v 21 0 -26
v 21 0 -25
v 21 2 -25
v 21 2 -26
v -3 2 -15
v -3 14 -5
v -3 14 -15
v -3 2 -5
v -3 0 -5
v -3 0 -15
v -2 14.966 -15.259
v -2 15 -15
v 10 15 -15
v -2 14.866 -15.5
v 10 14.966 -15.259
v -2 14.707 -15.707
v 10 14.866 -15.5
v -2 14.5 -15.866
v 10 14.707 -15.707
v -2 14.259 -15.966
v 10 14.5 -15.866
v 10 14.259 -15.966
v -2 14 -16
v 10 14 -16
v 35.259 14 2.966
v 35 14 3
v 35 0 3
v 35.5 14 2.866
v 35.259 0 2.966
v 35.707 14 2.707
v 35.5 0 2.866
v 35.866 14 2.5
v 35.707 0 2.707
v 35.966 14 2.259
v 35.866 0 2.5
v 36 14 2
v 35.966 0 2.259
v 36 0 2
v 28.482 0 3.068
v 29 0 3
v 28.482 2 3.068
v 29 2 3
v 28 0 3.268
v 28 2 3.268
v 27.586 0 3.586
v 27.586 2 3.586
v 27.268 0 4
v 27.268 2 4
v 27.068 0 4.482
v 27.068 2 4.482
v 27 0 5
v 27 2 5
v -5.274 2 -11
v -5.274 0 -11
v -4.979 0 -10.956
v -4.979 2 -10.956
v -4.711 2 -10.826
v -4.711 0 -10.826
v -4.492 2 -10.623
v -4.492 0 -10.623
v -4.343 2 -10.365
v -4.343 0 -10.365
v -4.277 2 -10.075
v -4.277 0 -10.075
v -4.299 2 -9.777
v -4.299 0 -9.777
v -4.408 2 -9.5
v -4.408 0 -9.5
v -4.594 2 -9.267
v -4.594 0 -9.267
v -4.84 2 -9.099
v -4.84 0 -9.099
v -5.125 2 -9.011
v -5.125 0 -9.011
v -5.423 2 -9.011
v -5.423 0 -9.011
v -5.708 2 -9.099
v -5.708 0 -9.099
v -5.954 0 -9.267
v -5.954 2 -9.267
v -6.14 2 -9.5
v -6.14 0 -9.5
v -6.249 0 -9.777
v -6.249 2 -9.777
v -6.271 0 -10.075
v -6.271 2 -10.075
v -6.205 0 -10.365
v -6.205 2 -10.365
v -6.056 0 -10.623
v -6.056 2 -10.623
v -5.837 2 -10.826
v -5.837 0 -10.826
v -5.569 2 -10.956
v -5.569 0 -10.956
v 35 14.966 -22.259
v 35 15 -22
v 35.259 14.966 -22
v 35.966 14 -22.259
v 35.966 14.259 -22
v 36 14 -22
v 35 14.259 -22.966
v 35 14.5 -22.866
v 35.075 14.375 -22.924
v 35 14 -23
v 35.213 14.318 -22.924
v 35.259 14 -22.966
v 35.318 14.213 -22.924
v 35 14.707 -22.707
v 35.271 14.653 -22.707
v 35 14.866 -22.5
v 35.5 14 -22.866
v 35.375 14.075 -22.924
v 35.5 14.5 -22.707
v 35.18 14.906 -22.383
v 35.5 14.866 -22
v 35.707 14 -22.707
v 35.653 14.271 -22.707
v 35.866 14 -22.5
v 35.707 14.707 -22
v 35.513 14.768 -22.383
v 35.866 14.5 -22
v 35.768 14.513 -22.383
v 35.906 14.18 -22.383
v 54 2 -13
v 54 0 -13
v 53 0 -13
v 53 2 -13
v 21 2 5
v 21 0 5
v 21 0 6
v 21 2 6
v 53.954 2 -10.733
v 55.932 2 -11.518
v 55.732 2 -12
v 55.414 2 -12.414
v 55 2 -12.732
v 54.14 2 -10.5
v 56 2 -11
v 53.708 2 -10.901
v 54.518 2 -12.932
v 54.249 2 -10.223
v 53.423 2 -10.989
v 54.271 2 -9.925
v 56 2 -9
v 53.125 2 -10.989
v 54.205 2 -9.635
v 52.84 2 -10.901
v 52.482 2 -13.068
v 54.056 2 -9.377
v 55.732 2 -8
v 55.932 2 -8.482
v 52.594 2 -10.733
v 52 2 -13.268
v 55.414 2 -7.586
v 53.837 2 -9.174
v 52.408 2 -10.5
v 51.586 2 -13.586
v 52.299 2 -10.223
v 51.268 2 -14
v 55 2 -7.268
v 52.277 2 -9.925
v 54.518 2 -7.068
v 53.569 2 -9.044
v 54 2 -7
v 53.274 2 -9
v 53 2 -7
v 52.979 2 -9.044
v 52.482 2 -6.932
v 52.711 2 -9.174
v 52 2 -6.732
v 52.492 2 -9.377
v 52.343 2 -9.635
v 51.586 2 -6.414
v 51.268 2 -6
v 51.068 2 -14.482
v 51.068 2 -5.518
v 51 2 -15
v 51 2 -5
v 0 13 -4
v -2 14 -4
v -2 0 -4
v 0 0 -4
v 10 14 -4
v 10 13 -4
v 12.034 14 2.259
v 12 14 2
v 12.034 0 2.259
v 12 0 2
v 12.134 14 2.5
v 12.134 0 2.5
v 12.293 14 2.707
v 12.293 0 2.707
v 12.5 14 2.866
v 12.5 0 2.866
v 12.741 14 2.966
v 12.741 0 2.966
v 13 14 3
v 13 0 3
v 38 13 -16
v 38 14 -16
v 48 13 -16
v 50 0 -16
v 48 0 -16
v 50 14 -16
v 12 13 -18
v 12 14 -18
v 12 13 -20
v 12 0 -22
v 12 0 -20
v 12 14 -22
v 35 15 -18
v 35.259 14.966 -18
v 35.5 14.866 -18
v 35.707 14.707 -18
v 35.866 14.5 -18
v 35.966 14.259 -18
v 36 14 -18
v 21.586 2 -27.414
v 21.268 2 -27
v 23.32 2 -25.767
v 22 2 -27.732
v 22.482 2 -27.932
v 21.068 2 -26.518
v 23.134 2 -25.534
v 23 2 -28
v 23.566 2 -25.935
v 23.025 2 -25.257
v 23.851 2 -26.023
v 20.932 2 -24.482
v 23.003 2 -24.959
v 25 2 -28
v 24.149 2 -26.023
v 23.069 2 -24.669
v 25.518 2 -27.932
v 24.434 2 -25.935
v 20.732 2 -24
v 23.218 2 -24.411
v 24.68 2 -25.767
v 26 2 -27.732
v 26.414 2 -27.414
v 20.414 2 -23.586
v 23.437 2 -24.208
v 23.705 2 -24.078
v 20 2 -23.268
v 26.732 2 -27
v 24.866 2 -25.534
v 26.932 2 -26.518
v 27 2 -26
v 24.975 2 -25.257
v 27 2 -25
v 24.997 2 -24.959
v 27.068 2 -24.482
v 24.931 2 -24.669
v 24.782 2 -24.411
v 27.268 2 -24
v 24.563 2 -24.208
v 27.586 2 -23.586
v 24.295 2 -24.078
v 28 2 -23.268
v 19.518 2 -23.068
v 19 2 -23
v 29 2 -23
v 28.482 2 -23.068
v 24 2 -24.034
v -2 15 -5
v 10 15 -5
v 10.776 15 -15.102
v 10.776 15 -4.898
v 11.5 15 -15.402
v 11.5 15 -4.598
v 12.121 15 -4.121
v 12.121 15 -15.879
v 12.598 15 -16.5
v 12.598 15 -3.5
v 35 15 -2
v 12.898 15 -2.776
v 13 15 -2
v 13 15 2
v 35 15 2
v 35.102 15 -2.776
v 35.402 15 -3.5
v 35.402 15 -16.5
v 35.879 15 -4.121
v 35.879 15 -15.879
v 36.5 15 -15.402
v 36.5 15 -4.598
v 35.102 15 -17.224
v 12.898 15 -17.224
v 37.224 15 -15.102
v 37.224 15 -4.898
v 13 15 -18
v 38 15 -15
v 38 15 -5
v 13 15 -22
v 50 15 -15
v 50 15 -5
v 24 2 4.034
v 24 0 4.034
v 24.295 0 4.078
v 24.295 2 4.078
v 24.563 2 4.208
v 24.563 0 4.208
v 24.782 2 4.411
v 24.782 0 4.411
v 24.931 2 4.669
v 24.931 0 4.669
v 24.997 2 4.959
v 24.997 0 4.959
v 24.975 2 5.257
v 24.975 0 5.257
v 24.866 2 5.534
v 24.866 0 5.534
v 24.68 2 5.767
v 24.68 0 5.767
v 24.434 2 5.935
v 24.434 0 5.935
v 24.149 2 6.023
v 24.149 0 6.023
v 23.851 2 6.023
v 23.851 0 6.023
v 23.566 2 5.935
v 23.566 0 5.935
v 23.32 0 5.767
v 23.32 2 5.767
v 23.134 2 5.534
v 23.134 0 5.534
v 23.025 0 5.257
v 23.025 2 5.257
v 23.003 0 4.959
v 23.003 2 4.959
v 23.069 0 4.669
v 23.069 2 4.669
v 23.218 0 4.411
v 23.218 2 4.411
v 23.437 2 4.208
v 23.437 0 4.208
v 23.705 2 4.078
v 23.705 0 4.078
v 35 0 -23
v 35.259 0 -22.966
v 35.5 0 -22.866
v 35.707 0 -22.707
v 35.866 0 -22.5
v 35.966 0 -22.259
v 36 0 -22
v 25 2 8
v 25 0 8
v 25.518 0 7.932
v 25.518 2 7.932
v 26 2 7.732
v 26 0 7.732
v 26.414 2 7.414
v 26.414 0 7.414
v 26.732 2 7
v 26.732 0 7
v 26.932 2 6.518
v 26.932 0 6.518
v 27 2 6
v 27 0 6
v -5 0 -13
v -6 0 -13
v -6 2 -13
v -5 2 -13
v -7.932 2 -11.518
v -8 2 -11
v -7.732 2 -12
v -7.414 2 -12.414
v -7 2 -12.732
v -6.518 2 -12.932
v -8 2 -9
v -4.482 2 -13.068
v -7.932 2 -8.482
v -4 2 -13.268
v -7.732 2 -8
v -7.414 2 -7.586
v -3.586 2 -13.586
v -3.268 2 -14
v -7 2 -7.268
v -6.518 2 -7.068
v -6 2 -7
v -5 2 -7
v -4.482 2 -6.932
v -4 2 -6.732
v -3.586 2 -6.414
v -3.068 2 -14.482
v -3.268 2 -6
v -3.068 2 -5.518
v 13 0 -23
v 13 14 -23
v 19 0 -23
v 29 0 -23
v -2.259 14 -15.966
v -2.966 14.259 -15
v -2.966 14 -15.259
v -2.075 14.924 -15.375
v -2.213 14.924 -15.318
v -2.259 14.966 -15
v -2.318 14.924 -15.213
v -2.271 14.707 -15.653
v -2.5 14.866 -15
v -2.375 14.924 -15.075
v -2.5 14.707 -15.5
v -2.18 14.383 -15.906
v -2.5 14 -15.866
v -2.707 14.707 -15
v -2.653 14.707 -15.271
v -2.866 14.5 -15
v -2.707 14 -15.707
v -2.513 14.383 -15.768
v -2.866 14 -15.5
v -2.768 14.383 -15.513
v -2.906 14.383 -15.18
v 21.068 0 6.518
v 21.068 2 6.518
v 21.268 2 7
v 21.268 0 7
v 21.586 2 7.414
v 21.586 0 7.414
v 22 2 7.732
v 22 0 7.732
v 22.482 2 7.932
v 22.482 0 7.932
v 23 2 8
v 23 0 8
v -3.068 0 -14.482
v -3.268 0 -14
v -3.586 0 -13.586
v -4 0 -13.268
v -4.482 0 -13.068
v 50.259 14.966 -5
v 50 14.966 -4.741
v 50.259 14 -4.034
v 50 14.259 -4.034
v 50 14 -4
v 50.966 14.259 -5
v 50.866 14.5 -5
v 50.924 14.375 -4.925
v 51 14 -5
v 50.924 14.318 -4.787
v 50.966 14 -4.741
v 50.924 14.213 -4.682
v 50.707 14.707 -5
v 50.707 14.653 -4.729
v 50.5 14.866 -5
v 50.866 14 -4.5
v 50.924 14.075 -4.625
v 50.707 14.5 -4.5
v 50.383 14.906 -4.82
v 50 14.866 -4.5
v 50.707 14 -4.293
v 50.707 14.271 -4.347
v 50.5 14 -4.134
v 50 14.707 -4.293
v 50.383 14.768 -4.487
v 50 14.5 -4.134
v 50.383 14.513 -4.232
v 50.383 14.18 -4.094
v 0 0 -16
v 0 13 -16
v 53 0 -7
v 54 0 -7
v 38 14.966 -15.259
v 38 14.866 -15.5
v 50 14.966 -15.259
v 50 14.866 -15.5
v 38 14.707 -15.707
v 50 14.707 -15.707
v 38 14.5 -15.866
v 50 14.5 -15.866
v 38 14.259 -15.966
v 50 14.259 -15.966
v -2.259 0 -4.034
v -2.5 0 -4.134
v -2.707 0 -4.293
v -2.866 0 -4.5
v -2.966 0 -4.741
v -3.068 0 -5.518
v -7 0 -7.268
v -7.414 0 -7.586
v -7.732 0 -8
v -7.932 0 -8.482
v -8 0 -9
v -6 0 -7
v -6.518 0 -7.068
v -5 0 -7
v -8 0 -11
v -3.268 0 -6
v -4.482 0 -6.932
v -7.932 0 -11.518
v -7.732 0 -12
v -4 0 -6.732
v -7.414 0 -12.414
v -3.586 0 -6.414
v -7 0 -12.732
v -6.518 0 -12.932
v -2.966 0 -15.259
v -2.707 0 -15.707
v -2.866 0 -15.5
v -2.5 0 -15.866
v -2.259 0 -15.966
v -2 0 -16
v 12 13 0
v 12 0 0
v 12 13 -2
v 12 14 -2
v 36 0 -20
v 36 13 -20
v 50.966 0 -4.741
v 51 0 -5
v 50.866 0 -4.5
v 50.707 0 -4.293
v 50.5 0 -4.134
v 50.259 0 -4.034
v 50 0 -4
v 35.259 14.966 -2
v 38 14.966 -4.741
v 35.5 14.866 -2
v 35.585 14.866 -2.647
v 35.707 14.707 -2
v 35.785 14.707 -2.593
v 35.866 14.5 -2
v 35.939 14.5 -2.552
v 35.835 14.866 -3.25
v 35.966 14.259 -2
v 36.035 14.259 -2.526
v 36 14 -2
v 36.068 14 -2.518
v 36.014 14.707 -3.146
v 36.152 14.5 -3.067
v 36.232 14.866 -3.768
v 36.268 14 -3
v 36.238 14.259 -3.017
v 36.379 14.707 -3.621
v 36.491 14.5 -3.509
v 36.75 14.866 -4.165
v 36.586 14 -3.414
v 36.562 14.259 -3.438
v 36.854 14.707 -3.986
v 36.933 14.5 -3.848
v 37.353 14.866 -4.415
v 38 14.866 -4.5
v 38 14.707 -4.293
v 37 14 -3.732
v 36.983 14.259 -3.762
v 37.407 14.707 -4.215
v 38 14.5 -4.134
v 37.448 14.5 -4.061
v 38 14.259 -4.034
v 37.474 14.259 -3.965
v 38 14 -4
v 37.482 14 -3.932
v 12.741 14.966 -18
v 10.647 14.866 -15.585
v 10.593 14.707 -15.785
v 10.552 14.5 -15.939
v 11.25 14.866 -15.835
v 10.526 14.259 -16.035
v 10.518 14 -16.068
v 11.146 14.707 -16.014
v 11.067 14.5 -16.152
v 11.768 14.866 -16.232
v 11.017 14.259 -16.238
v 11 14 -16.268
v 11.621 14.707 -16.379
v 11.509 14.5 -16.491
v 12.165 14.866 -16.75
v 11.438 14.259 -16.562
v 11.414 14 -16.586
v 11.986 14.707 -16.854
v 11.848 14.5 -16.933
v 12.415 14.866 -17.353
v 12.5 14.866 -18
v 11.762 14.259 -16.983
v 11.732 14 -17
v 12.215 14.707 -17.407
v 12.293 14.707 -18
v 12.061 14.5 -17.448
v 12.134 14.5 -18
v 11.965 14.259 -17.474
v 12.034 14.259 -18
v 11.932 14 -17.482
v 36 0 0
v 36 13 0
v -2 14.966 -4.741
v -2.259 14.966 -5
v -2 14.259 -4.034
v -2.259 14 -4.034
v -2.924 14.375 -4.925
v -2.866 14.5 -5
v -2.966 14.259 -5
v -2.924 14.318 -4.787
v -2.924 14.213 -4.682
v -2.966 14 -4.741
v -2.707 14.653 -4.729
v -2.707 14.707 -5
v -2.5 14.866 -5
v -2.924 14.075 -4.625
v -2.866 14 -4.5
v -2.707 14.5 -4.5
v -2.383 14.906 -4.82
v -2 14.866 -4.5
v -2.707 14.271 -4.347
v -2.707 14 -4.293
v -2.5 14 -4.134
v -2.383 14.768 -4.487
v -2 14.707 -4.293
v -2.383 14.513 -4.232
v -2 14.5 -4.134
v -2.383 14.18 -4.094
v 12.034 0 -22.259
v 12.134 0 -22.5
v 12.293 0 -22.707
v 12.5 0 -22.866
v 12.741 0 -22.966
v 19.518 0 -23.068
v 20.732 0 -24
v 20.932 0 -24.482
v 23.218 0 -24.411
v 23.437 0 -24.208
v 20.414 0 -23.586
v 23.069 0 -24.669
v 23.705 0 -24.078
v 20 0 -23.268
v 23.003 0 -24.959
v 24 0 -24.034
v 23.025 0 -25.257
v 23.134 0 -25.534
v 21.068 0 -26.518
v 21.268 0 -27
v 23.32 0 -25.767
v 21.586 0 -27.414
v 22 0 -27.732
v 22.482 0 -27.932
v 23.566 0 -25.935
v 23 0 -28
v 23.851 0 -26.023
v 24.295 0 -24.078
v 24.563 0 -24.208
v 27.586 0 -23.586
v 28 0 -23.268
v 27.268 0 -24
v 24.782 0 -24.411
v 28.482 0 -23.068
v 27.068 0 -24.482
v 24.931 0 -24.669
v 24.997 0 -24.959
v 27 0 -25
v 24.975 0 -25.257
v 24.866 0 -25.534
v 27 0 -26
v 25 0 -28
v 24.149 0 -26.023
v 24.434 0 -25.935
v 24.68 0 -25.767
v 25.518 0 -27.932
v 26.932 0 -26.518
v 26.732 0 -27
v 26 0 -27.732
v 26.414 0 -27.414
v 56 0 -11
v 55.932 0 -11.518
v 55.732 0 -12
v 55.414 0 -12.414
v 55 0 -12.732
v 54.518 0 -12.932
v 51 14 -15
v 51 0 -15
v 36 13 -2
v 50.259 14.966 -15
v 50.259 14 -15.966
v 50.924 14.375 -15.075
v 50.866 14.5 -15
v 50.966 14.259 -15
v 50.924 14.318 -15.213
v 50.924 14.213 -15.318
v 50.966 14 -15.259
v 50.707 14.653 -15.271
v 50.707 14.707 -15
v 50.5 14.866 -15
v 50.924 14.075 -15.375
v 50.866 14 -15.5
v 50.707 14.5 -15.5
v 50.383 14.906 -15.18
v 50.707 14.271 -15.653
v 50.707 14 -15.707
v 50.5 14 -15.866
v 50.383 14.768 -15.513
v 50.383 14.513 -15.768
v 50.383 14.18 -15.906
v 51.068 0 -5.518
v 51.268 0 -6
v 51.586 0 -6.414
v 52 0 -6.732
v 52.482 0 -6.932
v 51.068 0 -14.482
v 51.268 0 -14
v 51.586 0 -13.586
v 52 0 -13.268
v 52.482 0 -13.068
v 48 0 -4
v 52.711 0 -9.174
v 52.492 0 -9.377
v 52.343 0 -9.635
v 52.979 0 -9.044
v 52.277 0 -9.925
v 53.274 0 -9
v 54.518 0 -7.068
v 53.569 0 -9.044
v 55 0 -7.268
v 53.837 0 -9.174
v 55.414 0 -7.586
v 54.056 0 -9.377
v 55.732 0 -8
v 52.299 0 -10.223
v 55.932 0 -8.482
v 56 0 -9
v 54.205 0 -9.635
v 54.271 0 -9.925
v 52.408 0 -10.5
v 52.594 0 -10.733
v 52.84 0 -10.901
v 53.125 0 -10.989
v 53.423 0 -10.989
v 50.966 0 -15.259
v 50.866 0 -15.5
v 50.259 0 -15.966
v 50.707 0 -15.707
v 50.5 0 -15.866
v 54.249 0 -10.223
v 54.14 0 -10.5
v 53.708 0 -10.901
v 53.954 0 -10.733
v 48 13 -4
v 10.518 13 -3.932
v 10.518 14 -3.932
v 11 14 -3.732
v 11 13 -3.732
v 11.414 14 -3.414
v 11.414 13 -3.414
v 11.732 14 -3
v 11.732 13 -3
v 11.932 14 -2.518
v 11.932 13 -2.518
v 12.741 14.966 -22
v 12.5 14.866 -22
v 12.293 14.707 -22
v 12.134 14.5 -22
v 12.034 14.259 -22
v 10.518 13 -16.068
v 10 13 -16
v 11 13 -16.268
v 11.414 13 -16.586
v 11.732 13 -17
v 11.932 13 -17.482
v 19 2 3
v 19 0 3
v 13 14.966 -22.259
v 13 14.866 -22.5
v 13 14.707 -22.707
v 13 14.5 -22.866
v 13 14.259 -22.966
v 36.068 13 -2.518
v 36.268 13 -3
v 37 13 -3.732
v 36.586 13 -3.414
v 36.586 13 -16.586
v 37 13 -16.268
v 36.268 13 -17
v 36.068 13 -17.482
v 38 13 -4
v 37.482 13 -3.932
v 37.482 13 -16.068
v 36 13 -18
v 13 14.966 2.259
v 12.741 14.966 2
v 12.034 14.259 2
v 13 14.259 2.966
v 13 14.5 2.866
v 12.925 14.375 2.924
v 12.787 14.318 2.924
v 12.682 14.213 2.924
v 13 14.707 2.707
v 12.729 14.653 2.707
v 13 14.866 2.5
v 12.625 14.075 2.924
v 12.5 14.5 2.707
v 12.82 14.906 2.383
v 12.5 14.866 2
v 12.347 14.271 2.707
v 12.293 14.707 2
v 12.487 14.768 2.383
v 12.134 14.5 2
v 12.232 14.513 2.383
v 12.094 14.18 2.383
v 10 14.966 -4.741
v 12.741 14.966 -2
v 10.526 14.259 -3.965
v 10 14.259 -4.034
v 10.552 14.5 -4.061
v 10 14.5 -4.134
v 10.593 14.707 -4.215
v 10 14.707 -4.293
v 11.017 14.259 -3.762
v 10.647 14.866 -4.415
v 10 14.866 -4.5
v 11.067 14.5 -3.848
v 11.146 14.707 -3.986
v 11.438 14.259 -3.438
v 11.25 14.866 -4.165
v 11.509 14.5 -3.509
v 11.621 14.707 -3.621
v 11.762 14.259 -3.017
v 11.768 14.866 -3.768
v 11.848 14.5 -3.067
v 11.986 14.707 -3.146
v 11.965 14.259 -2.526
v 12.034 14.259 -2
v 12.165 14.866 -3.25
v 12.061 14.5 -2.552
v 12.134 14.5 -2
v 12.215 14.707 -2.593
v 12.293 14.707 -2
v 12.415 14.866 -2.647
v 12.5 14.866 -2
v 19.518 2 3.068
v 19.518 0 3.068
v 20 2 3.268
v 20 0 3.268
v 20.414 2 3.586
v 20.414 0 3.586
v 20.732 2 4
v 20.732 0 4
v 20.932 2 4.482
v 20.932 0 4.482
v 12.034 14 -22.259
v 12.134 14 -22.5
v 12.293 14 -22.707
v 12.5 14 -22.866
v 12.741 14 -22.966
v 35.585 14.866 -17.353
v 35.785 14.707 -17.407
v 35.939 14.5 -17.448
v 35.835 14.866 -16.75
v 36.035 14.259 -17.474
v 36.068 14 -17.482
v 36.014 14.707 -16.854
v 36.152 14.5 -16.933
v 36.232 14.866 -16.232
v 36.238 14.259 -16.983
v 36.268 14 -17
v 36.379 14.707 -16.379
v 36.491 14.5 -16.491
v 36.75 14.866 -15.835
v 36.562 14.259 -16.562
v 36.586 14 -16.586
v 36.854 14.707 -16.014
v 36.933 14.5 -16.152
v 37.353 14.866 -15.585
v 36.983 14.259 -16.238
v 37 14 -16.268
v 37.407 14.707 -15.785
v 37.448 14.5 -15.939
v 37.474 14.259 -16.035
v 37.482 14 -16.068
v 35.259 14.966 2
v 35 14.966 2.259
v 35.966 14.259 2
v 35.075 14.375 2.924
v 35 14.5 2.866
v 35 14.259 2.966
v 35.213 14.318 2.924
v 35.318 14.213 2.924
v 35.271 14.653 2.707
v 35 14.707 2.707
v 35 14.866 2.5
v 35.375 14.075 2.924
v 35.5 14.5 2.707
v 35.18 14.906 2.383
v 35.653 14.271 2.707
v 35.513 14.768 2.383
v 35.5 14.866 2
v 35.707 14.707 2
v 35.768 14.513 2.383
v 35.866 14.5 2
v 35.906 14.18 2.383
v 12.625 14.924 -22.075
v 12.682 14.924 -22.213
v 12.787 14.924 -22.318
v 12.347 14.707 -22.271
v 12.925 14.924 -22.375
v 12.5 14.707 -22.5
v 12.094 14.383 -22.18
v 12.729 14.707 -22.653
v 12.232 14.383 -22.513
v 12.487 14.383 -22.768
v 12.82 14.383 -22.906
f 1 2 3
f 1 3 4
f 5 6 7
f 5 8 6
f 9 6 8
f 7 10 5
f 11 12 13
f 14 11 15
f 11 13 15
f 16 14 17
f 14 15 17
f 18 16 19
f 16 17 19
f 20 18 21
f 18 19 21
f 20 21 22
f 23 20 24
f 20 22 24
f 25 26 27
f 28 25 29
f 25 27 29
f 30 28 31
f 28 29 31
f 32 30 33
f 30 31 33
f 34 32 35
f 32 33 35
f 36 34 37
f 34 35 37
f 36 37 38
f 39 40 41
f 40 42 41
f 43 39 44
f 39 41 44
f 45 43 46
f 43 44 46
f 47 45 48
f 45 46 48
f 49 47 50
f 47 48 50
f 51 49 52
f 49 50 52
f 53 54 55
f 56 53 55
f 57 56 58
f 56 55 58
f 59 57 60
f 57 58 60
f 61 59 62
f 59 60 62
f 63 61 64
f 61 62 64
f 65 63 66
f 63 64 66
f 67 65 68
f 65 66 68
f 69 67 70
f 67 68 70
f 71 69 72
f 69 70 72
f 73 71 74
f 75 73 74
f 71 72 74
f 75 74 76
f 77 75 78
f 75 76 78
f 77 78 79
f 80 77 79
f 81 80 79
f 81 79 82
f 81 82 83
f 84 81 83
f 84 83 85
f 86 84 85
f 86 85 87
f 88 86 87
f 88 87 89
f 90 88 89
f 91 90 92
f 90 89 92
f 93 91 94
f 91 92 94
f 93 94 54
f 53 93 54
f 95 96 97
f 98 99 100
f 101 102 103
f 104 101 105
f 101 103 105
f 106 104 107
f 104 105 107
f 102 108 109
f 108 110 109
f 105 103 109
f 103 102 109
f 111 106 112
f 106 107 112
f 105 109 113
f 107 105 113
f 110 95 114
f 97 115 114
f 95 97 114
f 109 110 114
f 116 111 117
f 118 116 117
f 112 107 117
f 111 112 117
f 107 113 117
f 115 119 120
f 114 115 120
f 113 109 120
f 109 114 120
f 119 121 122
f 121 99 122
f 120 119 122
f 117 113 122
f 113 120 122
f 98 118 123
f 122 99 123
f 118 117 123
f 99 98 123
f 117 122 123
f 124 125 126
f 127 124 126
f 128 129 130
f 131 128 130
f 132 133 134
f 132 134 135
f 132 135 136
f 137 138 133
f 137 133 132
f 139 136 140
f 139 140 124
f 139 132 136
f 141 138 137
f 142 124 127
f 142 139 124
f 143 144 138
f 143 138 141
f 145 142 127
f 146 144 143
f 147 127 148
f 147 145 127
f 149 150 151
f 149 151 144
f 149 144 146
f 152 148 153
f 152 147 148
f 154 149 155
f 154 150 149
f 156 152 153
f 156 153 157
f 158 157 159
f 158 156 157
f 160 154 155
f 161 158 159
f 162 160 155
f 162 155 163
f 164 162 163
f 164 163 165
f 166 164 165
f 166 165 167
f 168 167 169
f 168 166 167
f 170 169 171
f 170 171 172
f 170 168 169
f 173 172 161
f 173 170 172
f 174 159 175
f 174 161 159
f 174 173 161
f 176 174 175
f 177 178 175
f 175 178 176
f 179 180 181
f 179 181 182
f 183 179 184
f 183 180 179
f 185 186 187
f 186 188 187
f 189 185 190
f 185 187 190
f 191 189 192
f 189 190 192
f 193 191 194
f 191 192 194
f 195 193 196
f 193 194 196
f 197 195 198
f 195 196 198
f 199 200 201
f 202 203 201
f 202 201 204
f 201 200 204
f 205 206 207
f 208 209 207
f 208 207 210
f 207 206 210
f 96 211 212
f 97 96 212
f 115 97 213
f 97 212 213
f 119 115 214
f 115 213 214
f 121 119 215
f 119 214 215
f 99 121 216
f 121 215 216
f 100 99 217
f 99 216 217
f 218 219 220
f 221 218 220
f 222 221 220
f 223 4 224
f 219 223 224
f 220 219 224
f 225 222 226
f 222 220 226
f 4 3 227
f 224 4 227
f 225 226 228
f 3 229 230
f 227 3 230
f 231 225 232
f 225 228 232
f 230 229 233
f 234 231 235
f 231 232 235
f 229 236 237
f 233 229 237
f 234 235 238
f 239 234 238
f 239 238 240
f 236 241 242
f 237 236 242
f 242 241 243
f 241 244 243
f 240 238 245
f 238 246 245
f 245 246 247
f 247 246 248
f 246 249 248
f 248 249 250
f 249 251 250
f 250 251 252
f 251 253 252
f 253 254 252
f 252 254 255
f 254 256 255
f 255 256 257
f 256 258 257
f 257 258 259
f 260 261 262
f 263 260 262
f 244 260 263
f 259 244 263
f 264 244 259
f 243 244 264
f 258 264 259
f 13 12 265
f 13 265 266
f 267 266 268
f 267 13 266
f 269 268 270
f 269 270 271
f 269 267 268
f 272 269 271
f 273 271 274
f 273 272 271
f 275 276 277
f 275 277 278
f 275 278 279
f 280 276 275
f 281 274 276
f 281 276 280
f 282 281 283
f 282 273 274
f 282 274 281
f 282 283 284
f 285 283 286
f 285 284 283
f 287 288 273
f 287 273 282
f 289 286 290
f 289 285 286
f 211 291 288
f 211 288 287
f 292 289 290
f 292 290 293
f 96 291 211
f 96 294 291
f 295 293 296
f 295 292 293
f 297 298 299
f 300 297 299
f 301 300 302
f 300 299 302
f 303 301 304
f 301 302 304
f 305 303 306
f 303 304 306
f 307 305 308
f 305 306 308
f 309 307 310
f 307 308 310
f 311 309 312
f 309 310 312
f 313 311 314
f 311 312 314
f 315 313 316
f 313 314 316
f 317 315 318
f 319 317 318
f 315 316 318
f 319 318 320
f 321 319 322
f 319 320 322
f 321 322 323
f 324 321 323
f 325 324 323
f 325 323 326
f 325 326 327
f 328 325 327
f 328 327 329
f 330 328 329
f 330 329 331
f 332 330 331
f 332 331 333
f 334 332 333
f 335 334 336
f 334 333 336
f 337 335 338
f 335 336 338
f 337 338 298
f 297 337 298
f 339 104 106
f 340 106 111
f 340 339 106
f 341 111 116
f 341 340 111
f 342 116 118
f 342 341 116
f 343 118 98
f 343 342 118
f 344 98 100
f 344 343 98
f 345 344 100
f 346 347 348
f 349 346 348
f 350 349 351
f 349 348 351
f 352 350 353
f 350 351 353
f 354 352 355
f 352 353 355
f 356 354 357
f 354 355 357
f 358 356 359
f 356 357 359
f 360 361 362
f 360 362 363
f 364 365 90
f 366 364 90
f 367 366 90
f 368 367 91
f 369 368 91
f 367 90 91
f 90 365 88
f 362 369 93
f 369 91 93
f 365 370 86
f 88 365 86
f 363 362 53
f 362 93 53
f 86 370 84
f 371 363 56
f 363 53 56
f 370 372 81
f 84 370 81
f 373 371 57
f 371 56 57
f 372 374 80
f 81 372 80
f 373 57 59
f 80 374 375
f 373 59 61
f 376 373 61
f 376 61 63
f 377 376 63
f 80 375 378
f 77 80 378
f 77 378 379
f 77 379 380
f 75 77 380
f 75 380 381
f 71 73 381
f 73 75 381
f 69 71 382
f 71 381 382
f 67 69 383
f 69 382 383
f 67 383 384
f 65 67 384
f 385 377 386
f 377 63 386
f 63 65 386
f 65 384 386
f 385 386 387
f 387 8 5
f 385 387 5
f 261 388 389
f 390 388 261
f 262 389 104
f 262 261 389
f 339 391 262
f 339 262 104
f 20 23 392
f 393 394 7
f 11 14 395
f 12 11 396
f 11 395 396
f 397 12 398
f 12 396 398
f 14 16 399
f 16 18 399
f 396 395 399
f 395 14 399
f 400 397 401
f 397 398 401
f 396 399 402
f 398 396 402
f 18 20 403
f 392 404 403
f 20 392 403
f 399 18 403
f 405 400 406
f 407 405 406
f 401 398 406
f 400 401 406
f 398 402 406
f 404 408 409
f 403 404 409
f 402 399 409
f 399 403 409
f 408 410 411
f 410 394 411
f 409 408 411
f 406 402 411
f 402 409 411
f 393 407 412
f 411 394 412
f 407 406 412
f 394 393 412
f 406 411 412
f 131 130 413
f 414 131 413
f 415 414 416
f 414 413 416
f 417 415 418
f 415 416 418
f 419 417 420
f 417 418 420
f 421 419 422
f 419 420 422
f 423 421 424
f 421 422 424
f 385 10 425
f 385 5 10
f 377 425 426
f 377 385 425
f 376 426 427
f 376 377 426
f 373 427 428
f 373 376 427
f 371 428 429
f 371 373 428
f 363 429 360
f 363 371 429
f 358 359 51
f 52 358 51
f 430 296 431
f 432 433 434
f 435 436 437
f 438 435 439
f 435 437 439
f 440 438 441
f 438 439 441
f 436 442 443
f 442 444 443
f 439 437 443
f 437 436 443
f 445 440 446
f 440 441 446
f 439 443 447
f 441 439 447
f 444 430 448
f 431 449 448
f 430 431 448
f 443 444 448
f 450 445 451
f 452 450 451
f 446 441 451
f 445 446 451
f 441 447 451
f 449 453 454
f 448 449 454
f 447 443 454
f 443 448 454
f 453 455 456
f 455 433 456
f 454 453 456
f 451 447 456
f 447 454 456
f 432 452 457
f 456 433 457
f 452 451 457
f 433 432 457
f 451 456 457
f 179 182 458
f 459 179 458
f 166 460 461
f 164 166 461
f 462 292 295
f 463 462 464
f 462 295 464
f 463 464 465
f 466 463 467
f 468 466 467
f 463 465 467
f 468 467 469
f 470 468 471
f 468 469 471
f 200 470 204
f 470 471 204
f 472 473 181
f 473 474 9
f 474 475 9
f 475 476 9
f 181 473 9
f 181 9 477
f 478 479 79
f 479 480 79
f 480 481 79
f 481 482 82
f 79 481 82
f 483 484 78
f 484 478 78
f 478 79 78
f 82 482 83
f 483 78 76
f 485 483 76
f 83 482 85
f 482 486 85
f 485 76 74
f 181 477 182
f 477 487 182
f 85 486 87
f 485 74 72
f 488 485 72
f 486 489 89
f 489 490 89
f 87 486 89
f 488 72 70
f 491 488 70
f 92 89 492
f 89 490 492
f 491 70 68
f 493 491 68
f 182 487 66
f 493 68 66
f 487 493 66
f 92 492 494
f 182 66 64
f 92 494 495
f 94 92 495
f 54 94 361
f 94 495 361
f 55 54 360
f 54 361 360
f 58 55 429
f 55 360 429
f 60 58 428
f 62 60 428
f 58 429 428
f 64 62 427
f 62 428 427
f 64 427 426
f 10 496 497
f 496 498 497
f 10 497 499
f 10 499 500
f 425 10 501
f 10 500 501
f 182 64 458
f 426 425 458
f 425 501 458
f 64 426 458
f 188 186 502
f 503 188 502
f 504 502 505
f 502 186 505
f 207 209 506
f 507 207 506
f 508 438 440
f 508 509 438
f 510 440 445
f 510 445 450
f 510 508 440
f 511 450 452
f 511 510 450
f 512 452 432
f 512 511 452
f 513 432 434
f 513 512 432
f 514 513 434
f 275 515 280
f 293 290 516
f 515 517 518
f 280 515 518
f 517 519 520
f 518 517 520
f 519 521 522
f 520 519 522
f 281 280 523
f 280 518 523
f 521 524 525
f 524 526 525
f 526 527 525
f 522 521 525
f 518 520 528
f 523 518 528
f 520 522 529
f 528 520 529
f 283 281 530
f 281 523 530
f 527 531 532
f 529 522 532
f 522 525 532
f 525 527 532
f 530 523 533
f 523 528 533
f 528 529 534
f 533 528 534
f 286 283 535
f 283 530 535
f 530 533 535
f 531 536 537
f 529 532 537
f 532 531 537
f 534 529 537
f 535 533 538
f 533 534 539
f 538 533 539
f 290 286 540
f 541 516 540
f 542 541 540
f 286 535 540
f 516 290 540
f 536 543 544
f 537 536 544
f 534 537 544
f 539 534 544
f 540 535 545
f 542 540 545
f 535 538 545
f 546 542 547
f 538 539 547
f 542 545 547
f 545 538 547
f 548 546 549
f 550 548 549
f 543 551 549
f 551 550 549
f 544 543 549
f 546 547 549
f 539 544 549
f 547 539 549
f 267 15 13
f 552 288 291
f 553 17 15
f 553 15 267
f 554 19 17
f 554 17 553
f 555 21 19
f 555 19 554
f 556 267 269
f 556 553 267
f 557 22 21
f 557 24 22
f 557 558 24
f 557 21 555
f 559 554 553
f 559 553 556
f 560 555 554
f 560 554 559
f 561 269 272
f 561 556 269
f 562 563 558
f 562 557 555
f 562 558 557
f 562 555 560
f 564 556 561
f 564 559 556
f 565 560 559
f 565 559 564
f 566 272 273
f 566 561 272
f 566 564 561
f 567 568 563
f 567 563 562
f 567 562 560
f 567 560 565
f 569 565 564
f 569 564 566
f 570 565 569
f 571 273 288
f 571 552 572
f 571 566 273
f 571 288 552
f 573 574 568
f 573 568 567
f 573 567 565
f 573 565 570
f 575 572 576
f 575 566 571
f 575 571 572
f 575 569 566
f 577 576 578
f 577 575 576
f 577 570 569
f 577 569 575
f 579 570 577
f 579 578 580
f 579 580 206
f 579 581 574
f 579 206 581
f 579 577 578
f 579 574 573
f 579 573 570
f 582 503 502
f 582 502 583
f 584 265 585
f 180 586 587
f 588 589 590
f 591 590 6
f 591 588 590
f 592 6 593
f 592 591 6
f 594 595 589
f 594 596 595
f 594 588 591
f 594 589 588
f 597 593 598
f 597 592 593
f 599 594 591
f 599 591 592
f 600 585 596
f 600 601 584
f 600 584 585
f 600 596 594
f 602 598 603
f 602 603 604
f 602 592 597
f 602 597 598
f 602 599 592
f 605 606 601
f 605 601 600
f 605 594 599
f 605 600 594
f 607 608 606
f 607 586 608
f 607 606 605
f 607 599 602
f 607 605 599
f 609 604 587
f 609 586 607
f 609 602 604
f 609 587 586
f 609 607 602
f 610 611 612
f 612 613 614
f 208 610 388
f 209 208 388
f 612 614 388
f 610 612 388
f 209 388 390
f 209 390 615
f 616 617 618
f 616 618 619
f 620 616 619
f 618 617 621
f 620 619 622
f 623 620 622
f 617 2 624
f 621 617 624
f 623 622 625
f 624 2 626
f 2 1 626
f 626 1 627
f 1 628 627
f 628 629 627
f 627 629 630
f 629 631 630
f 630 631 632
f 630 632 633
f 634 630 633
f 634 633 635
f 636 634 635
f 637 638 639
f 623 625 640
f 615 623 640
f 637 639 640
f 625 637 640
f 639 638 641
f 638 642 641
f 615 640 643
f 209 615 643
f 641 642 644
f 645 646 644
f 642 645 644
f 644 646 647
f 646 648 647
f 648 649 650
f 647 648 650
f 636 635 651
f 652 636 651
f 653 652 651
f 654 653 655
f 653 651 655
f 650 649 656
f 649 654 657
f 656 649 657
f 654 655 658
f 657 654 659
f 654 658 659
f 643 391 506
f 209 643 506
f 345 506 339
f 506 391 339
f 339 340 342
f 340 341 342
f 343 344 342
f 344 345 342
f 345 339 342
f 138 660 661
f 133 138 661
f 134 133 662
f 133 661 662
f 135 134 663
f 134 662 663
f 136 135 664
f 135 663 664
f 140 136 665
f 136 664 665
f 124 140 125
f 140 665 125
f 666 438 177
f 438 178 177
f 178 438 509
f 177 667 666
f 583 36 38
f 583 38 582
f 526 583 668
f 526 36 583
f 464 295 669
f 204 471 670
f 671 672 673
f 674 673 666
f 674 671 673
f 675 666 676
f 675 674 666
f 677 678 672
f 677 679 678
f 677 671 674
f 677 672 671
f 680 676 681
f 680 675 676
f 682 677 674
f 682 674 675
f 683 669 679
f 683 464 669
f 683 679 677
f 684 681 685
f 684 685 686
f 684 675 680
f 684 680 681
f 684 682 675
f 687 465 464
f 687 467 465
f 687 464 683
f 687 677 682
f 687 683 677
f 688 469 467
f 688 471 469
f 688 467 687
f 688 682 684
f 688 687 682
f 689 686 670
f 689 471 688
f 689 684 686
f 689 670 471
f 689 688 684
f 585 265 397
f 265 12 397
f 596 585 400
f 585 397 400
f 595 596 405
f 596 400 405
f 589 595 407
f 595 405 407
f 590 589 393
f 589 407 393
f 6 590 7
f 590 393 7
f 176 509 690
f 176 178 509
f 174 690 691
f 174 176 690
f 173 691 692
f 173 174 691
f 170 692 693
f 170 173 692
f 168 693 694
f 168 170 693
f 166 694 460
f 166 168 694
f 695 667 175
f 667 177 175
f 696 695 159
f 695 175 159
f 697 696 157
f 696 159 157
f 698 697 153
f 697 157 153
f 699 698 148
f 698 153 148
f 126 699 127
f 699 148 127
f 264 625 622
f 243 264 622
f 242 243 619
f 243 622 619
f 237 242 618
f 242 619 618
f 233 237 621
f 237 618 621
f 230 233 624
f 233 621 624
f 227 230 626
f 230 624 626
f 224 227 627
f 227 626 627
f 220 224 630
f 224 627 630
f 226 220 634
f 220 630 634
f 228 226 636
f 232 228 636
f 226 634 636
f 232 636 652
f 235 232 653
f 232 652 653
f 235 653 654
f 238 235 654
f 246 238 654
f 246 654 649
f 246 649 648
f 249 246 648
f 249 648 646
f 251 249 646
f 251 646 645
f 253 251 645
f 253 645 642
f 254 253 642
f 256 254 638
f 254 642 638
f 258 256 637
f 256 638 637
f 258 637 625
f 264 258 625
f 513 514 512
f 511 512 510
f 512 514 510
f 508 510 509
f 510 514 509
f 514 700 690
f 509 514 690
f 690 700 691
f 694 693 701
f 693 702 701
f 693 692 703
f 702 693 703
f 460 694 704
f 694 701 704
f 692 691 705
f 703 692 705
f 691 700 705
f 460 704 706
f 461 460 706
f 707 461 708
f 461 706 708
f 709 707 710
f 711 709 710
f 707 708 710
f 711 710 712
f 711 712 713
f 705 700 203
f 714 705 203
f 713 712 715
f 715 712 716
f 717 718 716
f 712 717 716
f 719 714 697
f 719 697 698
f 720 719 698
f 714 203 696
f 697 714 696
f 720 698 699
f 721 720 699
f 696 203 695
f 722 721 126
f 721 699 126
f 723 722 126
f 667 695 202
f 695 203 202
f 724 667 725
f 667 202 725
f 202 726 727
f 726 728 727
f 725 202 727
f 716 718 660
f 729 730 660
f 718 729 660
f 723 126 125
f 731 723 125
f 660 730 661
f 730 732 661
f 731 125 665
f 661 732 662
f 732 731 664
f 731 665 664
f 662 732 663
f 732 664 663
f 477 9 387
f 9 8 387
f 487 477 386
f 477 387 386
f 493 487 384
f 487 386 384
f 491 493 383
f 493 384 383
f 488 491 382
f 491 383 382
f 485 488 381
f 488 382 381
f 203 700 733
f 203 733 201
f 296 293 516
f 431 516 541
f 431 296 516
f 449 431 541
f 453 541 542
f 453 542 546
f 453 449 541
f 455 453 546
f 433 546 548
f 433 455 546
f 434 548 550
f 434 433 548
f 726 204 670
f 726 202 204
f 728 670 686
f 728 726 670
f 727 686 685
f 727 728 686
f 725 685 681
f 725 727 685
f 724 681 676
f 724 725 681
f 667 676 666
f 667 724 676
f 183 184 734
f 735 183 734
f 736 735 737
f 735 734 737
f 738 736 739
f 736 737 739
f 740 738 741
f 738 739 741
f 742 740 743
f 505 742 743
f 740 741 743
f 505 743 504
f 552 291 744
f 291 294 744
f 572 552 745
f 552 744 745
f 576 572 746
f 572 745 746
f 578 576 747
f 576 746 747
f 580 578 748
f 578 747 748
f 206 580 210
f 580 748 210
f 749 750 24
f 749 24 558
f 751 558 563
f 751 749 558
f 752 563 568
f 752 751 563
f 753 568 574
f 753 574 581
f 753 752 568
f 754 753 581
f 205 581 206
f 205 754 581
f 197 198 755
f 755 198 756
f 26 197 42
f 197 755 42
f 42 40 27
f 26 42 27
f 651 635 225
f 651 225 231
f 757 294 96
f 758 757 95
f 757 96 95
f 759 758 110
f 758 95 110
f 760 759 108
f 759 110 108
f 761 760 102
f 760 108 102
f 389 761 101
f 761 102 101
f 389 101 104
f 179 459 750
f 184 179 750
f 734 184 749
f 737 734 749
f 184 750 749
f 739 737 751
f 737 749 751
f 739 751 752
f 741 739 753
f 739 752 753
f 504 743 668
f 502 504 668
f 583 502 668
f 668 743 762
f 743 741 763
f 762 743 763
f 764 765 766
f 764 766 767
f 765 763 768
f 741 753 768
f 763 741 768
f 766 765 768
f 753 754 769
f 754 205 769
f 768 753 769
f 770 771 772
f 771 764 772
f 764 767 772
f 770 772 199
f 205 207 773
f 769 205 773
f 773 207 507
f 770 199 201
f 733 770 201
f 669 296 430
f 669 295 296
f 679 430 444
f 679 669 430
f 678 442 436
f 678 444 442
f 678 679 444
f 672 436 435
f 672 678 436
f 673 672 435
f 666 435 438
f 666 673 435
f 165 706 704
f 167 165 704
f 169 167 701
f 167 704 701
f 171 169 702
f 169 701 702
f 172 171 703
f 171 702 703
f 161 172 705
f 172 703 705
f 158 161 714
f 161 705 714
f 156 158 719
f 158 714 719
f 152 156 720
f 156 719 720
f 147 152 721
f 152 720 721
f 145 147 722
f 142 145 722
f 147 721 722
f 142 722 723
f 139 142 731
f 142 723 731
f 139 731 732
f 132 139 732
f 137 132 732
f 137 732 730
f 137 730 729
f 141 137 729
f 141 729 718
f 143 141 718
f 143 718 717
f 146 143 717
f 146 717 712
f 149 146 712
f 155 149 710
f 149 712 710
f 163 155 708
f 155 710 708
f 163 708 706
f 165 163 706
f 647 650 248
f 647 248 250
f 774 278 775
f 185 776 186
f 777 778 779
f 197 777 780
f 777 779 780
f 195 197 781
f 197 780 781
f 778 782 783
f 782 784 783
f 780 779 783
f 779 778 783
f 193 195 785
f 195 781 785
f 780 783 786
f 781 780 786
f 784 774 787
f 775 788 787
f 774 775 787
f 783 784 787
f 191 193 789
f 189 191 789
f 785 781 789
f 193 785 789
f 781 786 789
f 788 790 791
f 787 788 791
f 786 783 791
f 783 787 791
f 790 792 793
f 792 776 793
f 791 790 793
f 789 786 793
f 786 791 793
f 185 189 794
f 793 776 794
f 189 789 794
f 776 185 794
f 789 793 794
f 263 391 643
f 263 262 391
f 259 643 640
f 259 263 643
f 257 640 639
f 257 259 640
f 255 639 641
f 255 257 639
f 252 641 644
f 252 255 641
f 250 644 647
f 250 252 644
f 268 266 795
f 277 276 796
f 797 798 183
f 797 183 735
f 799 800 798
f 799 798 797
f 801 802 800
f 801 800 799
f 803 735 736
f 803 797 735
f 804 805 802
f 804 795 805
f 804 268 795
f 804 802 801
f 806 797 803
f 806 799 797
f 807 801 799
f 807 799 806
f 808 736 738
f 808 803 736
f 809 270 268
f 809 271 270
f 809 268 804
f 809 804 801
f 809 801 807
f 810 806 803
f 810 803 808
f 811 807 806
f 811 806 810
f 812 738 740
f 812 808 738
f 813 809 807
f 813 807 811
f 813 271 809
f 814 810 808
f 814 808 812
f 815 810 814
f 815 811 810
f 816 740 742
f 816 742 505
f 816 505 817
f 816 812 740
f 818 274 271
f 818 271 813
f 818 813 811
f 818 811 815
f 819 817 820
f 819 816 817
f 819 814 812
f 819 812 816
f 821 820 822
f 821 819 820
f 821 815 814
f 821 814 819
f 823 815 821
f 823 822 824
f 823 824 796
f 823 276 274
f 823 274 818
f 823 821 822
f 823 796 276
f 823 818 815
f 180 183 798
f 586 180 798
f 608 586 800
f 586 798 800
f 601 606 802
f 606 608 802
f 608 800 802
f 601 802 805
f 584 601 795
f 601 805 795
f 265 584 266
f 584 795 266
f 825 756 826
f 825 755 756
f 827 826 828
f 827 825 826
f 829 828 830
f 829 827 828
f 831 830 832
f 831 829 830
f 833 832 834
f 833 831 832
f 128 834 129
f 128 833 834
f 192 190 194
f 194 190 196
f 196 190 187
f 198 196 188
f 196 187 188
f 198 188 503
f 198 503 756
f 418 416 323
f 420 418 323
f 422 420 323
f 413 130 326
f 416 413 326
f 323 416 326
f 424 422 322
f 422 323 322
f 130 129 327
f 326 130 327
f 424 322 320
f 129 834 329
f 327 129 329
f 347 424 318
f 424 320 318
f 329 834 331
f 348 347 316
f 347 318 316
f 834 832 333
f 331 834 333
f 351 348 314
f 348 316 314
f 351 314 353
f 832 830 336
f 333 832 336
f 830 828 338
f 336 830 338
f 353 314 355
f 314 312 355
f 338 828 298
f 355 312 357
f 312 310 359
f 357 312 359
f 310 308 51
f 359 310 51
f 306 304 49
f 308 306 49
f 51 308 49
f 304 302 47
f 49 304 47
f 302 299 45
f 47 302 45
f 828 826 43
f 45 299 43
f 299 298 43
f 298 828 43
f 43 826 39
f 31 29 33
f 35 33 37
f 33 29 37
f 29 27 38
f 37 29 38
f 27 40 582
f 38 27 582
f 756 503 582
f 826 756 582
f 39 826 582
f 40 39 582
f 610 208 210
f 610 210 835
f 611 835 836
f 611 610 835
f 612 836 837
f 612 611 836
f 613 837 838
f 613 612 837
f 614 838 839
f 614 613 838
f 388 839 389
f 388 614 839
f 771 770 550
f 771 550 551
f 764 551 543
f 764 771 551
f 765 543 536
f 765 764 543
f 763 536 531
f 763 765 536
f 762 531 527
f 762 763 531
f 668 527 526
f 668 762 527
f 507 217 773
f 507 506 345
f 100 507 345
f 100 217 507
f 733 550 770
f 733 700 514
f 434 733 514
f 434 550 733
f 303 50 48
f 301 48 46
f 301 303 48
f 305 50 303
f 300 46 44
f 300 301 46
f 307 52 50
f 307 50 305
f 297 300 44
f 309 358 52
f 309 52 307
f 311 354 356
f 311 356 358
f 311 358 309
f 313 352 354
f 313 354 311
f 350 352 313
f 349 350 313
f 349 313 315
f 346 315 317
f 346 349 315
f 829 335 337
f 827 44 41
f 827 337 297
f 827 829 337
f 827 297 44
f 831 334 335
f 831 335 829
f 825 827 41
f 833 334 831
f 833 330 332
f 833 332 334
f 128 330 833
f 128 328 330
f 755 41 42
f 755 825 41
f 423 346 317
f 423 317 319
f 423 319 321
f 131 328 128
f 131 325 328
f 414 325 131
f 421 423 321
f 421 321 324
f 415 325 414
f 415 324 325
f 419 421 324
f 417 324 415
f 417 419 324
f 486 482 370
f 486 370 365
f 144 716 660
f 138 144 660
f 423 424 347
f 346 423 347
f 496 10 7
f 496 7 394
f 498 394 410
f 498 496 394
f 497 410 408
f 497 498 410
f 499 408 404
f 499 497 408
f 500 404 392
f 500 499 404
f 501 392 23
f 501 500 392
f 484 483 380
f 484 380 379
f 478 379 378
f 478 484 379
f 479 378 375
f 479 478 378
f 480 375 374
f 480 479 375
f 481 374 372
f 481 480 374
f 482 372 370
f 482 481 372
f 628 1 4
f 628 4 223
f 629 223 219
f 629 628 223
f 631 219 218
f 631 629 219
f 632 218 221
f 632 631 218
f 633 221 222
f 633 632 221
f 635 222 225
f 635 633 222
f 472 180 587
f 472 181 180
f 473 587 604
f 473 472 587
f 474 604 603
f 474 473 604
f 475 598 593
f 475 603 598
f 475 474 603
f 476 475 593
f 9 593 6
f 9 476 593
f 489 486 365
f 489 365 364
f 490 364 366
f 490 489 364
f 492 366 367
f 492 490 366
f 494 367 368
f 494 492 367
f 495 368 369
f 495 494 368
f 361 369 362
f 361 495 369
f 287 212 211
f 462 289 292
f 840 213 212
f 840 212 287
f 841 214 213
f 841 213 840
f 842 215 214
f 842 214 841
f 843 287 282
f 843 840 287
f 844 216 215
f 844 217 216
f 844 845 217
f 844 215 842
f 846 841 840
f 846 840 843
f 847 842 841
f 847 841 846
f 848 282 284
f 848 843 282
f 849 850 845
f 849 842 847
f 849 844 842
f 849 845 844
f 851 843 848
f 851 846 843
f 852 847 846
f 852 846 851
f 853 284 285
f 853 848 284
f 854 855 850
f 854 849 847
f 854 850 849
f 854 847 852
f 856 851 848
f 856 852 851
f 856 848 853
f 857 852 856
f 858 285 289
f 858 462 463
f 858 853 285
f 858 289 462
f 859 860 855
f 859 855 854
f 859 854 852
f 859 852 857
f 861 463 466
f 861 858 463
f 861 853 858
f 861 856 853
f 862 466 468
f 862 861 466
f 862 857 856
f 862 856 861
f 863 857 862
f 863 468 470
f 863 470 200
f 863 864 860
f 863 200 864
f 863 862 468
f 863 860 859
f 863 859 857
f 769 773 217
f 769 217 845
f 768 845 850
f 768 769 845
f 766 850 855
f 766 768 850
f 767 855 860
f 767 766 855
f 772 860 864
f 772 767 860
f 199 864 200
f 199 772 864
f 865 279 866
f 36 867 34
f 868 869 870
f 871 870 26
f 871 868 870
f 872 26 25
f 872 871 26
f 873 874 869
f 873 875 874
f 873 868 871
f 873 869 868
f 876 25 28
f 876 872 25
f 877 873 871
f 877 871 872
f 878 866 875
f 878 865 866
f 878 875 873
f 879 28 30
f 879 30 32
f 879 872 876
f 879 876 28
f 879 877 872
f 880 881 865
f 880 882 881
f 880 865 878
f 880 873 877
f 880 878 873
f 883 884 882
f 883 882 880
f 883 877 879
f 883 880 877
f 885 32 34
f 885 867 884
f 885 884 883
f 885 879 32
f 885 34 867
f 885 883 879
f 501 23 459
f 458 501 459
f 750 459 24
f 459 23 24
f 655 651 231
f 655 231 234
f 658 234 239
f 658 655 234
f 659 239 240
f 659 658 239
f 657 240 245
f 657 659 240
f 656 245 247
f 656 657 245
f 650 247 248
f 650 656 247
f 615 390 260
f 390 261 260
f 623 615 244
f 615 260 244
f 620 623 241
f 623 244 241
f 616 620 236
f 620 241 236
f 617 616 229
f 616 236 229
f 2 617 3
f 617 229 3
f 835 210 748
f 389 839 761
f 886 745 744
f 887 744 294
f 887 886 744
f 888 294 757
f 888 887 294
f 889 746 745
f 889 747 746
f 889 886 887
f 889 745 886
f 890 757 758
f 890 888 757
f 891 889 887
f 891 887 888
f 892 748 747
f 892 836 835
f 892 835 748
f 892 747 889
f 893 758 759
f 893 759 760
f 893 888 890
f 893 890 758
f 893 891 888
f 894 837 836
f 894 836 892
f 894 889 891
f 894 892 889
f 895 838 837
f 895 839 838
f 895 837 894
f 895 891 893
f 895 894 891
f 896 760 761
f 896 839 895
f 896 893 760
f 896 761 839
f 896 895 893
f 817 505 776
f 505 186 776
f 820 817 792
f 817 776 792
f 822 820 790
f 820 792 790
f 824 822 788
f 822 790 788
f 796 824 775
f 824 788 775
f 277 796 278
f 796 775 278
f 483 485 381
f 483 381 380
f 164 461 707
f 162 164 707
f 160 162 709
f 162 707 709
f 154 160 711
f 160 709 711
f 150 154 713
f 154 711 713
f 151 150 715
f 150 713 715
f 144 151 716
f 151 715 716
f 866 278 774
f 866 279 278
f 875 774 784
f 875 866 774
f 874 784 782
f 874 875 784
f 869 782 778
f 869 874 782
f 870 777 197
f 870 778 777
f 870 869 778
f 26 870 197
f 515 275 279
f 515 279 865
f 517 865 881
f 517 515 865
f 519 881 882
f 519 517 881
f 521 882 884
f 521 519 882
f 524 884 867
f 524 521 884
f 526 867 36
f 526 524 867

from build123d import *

# Parameters (mm, degrees)
SKETCH1_W           = 54
SKETCH1_H           = 26
SKETCH1_W_2         = 48
SKETCH1_H_2         = 20
BOSS_EXTRUDE1_DEPTH = 13
SKETCH2_W           = 54
SKETCH2_H           = 26
BOSS_EXTRUDE2_DEPTH = 2
SKETCH3_W           = 15
SKETCH3_H           = 7
CUT_EXTRUDE1_DEPTH  = 58.92236183
FILLET1_R           = 2
FILLET2_R           = 1
SKETCH4_R           = 1
BOSS_EXTRUDE3_DEPTH = 2
FILLET3_R           = 2


with BuildPart() as part:
    # Sketch1 → Boss-Extrude1 (new body)
    with BuildSketch(Plane(origin=(0, 0, 0), x_dir=(1, 0, 0), z_dir=(0, 1, 0))):
        with Locations((24, 10)):
            Rectangle(SKETCH1_W, SKETCH1_H)
        with Locations((24, 10)):
            Rectangle(SKETCH1_W_2, SKETCH1_H_2, mode=Mode.SUBTRACT)
    extrude(amount=BOSS_EXTRUDE1_DEPTH)

    # Sketch2 → Boss-Extrude2 (add)
    with BuildSketch(Plane(origin=(0, 13, 0), x_dir=(1, 0, 0), z_dir=(0, 1, 0))):
        with Locations((24, 10)):
            Rectangle(SKETCH2_W, SKETCH2_H)
    extrude(amount=BOSS_EXTRUDE2_DEPTH)

    # Sketch3 → Cut-Extrude1 (cut, through all)
    with BuildSketch(Plane(origin=(0, 15, 0), x_dir=(1, 0, 0), z_dir=(0, 1, 0))):
        with Locations((4.5, 19.5)):
            Rectangle(SKETCH3_W, SKETCH3_H)
        with Locations((4.5, 0.5)):
            Rectangle(SKETCH3_W, SKETCH3_H)
        with Locations((43.5, 0.5)):
            Rectangle(SKETCH3_W, SKETCH3_H)
        with Locations((43.5, 19.5)):
            Rectangle(SKETCH3_W, SKETCH3_H)
    extrude(amount=-CUT_EXTRUDE1_DEPTH, mode=Mode.SUBTRACT)

    # Fillet1
    fillet1_edges = [part.edges().sort_by_distance(p)[0] for p in [
        (12, 14, -16),
        (36, 14, -16),
        (36, 14, -4),
        (12, 14, -4),
    ]]
    fillet(fillet1_edges, radius=FILLET1_R)

    # Fillet2
    fillet2_edges = [part.edges().sort_by_distance(p)[0] for p in [
        (-3, 7.5, -16),
        (12, 7.5, -23),
        (3.5, 15, -16),
        (36, 15, 0.5),
        (3.5, 15, -4),
        (12, 15, -20.5),
        (44.5, 15, -16),
        (36.585786438, 15, -3.414213562),
        (11.414213562, 15, -3.414213562),
        (11.414213562, 15, -16.585786438),
        (36.585786438, 15, -16.585786438),
        (-3, 15, -10),
        (24, 15, 3),
        (51, 15, -10),
        (24, 15, -23),
        (51, 7.5, -16),
        (36, 7.5, -23),
        (36, 15, -20.5),
        (51, 7.5, -4),
        (36, 7.5, 3),
        (44.5, 15, -4),
        (-3, 7.5, -4),
        (12, 7.5, 3),
        (12, 15, 0.5),
    ]]
    fillet(fillet2_edges, radius=FILLET2_R)

    # Sketch4 → Boss-Extrude3 (add)
    # profile 1 of 4: a face of its own
    with BuildSketch(Plane.XZ):
        with BuildLine():
            Line((24, 3), (21, 3))
            Line((21, 3), (21, 6))
            ThreePointArc((21, 6), (21.585786438, 7.414213562), (23, 8))
            Line((23, 8), (25, 8))
            ThreePointArc((25, 8), (26.414213562, 7.414213562), (27, 6))
            Line((27, 6), (27, 3))
            Line((27, 3), (24, 3))
        make_face()
        with Locations(Location((24, 5.034061628, 0), (0, 0, 270))):
            Circle(SKETCH4_R, mode=Mode.SUBTRACT)
    # profile 2 of 4: a face of its own
    with BuildSketch(Plane.XZ):
        with BuildLine():
            Line((27, -23), (24, -23))
            Line((24, -23), (21, -23))
            Line((21, -23), (21, -26))
            ThreePointArc((21, -26), (21.585786438, -27.414213562), (23, -28))
            Line((23, -28), (25, -28))
            ThreePointArc((25, -28), (26.414213562, -27.414213562), (27, -26))
            Line((27, -26), (27, -23))
        make_face()
        with Locations(Location((24, -25.034061628, 0), (0, 0, 90))):
            Circle(SKETCH4_R, mode=Mode.SUBTRACT)
    # profile 3 of 4: a face of its own
    with BuildSketch(Plane.XZ):
        with BuildLine():
            Line((-3, -10), (-3, -7))
            Line((-3, -7), (-6, -7))
            ThreePointArc((-6, -7), (-7.414213562, -7.585786438), (-8, -9))
            Line((-8, -9), (-8, -11))
            ThreePointArc((-8, -11), (-7.414213562, -12.414213562), (-6, -13))
            Line((-6, -13), (-3, -13))
            Line((-3, -13), (-3, -10))
        make_face()
        with Locations(Location((-5.274023851, -10, 0), (0, 0, 270))):
            Circle(SKETCH4_R, mode=Mode.SUBTRACT)
    # profile 4 of 4: a face of its own
    with BuildSketch(Plane.XZ):
        with BuildLine():
            Line((51, -13), (51, -10))
            Line((51, -10), (51, -7))
            Line((51, -7), (54, -7))
            ThreePointArc((54, -7), (55.414213562, -7.585786438), (56, -9))
            Line((56, -9), (56, -11))
            ThreePointArc((56, -11), (55.414213562, -12.414213562), (54, -13))
            Line((54, -13), (51, -13))
        make_face()
        with Locations(Location((53.274023851, -10, 0), (0, 0, 90))):
            Circle(SKETCH4_R, mode=Mode.SUBTRACT)
    extrude(amount=-BOSS_EXTRUDE3_DEPTH)

    # Fillet3
    fillet3_edges = [part.edges().sort_by_distance(p)[0] for p in [
        (27, 1, 3),
        (21, 1, 3),
        (51, 1, -7),
        (51, 1, -13),
        (27, 1, -23),
        (21, 1, -23),
        (-3, 1, -13),
        (-3, 1, -7),
    ]]
    fillet(fillet3_edges, radius=FILLET3_R - 0.0001)  # a hair under: the kernel refuses the full size


solid = part.part
